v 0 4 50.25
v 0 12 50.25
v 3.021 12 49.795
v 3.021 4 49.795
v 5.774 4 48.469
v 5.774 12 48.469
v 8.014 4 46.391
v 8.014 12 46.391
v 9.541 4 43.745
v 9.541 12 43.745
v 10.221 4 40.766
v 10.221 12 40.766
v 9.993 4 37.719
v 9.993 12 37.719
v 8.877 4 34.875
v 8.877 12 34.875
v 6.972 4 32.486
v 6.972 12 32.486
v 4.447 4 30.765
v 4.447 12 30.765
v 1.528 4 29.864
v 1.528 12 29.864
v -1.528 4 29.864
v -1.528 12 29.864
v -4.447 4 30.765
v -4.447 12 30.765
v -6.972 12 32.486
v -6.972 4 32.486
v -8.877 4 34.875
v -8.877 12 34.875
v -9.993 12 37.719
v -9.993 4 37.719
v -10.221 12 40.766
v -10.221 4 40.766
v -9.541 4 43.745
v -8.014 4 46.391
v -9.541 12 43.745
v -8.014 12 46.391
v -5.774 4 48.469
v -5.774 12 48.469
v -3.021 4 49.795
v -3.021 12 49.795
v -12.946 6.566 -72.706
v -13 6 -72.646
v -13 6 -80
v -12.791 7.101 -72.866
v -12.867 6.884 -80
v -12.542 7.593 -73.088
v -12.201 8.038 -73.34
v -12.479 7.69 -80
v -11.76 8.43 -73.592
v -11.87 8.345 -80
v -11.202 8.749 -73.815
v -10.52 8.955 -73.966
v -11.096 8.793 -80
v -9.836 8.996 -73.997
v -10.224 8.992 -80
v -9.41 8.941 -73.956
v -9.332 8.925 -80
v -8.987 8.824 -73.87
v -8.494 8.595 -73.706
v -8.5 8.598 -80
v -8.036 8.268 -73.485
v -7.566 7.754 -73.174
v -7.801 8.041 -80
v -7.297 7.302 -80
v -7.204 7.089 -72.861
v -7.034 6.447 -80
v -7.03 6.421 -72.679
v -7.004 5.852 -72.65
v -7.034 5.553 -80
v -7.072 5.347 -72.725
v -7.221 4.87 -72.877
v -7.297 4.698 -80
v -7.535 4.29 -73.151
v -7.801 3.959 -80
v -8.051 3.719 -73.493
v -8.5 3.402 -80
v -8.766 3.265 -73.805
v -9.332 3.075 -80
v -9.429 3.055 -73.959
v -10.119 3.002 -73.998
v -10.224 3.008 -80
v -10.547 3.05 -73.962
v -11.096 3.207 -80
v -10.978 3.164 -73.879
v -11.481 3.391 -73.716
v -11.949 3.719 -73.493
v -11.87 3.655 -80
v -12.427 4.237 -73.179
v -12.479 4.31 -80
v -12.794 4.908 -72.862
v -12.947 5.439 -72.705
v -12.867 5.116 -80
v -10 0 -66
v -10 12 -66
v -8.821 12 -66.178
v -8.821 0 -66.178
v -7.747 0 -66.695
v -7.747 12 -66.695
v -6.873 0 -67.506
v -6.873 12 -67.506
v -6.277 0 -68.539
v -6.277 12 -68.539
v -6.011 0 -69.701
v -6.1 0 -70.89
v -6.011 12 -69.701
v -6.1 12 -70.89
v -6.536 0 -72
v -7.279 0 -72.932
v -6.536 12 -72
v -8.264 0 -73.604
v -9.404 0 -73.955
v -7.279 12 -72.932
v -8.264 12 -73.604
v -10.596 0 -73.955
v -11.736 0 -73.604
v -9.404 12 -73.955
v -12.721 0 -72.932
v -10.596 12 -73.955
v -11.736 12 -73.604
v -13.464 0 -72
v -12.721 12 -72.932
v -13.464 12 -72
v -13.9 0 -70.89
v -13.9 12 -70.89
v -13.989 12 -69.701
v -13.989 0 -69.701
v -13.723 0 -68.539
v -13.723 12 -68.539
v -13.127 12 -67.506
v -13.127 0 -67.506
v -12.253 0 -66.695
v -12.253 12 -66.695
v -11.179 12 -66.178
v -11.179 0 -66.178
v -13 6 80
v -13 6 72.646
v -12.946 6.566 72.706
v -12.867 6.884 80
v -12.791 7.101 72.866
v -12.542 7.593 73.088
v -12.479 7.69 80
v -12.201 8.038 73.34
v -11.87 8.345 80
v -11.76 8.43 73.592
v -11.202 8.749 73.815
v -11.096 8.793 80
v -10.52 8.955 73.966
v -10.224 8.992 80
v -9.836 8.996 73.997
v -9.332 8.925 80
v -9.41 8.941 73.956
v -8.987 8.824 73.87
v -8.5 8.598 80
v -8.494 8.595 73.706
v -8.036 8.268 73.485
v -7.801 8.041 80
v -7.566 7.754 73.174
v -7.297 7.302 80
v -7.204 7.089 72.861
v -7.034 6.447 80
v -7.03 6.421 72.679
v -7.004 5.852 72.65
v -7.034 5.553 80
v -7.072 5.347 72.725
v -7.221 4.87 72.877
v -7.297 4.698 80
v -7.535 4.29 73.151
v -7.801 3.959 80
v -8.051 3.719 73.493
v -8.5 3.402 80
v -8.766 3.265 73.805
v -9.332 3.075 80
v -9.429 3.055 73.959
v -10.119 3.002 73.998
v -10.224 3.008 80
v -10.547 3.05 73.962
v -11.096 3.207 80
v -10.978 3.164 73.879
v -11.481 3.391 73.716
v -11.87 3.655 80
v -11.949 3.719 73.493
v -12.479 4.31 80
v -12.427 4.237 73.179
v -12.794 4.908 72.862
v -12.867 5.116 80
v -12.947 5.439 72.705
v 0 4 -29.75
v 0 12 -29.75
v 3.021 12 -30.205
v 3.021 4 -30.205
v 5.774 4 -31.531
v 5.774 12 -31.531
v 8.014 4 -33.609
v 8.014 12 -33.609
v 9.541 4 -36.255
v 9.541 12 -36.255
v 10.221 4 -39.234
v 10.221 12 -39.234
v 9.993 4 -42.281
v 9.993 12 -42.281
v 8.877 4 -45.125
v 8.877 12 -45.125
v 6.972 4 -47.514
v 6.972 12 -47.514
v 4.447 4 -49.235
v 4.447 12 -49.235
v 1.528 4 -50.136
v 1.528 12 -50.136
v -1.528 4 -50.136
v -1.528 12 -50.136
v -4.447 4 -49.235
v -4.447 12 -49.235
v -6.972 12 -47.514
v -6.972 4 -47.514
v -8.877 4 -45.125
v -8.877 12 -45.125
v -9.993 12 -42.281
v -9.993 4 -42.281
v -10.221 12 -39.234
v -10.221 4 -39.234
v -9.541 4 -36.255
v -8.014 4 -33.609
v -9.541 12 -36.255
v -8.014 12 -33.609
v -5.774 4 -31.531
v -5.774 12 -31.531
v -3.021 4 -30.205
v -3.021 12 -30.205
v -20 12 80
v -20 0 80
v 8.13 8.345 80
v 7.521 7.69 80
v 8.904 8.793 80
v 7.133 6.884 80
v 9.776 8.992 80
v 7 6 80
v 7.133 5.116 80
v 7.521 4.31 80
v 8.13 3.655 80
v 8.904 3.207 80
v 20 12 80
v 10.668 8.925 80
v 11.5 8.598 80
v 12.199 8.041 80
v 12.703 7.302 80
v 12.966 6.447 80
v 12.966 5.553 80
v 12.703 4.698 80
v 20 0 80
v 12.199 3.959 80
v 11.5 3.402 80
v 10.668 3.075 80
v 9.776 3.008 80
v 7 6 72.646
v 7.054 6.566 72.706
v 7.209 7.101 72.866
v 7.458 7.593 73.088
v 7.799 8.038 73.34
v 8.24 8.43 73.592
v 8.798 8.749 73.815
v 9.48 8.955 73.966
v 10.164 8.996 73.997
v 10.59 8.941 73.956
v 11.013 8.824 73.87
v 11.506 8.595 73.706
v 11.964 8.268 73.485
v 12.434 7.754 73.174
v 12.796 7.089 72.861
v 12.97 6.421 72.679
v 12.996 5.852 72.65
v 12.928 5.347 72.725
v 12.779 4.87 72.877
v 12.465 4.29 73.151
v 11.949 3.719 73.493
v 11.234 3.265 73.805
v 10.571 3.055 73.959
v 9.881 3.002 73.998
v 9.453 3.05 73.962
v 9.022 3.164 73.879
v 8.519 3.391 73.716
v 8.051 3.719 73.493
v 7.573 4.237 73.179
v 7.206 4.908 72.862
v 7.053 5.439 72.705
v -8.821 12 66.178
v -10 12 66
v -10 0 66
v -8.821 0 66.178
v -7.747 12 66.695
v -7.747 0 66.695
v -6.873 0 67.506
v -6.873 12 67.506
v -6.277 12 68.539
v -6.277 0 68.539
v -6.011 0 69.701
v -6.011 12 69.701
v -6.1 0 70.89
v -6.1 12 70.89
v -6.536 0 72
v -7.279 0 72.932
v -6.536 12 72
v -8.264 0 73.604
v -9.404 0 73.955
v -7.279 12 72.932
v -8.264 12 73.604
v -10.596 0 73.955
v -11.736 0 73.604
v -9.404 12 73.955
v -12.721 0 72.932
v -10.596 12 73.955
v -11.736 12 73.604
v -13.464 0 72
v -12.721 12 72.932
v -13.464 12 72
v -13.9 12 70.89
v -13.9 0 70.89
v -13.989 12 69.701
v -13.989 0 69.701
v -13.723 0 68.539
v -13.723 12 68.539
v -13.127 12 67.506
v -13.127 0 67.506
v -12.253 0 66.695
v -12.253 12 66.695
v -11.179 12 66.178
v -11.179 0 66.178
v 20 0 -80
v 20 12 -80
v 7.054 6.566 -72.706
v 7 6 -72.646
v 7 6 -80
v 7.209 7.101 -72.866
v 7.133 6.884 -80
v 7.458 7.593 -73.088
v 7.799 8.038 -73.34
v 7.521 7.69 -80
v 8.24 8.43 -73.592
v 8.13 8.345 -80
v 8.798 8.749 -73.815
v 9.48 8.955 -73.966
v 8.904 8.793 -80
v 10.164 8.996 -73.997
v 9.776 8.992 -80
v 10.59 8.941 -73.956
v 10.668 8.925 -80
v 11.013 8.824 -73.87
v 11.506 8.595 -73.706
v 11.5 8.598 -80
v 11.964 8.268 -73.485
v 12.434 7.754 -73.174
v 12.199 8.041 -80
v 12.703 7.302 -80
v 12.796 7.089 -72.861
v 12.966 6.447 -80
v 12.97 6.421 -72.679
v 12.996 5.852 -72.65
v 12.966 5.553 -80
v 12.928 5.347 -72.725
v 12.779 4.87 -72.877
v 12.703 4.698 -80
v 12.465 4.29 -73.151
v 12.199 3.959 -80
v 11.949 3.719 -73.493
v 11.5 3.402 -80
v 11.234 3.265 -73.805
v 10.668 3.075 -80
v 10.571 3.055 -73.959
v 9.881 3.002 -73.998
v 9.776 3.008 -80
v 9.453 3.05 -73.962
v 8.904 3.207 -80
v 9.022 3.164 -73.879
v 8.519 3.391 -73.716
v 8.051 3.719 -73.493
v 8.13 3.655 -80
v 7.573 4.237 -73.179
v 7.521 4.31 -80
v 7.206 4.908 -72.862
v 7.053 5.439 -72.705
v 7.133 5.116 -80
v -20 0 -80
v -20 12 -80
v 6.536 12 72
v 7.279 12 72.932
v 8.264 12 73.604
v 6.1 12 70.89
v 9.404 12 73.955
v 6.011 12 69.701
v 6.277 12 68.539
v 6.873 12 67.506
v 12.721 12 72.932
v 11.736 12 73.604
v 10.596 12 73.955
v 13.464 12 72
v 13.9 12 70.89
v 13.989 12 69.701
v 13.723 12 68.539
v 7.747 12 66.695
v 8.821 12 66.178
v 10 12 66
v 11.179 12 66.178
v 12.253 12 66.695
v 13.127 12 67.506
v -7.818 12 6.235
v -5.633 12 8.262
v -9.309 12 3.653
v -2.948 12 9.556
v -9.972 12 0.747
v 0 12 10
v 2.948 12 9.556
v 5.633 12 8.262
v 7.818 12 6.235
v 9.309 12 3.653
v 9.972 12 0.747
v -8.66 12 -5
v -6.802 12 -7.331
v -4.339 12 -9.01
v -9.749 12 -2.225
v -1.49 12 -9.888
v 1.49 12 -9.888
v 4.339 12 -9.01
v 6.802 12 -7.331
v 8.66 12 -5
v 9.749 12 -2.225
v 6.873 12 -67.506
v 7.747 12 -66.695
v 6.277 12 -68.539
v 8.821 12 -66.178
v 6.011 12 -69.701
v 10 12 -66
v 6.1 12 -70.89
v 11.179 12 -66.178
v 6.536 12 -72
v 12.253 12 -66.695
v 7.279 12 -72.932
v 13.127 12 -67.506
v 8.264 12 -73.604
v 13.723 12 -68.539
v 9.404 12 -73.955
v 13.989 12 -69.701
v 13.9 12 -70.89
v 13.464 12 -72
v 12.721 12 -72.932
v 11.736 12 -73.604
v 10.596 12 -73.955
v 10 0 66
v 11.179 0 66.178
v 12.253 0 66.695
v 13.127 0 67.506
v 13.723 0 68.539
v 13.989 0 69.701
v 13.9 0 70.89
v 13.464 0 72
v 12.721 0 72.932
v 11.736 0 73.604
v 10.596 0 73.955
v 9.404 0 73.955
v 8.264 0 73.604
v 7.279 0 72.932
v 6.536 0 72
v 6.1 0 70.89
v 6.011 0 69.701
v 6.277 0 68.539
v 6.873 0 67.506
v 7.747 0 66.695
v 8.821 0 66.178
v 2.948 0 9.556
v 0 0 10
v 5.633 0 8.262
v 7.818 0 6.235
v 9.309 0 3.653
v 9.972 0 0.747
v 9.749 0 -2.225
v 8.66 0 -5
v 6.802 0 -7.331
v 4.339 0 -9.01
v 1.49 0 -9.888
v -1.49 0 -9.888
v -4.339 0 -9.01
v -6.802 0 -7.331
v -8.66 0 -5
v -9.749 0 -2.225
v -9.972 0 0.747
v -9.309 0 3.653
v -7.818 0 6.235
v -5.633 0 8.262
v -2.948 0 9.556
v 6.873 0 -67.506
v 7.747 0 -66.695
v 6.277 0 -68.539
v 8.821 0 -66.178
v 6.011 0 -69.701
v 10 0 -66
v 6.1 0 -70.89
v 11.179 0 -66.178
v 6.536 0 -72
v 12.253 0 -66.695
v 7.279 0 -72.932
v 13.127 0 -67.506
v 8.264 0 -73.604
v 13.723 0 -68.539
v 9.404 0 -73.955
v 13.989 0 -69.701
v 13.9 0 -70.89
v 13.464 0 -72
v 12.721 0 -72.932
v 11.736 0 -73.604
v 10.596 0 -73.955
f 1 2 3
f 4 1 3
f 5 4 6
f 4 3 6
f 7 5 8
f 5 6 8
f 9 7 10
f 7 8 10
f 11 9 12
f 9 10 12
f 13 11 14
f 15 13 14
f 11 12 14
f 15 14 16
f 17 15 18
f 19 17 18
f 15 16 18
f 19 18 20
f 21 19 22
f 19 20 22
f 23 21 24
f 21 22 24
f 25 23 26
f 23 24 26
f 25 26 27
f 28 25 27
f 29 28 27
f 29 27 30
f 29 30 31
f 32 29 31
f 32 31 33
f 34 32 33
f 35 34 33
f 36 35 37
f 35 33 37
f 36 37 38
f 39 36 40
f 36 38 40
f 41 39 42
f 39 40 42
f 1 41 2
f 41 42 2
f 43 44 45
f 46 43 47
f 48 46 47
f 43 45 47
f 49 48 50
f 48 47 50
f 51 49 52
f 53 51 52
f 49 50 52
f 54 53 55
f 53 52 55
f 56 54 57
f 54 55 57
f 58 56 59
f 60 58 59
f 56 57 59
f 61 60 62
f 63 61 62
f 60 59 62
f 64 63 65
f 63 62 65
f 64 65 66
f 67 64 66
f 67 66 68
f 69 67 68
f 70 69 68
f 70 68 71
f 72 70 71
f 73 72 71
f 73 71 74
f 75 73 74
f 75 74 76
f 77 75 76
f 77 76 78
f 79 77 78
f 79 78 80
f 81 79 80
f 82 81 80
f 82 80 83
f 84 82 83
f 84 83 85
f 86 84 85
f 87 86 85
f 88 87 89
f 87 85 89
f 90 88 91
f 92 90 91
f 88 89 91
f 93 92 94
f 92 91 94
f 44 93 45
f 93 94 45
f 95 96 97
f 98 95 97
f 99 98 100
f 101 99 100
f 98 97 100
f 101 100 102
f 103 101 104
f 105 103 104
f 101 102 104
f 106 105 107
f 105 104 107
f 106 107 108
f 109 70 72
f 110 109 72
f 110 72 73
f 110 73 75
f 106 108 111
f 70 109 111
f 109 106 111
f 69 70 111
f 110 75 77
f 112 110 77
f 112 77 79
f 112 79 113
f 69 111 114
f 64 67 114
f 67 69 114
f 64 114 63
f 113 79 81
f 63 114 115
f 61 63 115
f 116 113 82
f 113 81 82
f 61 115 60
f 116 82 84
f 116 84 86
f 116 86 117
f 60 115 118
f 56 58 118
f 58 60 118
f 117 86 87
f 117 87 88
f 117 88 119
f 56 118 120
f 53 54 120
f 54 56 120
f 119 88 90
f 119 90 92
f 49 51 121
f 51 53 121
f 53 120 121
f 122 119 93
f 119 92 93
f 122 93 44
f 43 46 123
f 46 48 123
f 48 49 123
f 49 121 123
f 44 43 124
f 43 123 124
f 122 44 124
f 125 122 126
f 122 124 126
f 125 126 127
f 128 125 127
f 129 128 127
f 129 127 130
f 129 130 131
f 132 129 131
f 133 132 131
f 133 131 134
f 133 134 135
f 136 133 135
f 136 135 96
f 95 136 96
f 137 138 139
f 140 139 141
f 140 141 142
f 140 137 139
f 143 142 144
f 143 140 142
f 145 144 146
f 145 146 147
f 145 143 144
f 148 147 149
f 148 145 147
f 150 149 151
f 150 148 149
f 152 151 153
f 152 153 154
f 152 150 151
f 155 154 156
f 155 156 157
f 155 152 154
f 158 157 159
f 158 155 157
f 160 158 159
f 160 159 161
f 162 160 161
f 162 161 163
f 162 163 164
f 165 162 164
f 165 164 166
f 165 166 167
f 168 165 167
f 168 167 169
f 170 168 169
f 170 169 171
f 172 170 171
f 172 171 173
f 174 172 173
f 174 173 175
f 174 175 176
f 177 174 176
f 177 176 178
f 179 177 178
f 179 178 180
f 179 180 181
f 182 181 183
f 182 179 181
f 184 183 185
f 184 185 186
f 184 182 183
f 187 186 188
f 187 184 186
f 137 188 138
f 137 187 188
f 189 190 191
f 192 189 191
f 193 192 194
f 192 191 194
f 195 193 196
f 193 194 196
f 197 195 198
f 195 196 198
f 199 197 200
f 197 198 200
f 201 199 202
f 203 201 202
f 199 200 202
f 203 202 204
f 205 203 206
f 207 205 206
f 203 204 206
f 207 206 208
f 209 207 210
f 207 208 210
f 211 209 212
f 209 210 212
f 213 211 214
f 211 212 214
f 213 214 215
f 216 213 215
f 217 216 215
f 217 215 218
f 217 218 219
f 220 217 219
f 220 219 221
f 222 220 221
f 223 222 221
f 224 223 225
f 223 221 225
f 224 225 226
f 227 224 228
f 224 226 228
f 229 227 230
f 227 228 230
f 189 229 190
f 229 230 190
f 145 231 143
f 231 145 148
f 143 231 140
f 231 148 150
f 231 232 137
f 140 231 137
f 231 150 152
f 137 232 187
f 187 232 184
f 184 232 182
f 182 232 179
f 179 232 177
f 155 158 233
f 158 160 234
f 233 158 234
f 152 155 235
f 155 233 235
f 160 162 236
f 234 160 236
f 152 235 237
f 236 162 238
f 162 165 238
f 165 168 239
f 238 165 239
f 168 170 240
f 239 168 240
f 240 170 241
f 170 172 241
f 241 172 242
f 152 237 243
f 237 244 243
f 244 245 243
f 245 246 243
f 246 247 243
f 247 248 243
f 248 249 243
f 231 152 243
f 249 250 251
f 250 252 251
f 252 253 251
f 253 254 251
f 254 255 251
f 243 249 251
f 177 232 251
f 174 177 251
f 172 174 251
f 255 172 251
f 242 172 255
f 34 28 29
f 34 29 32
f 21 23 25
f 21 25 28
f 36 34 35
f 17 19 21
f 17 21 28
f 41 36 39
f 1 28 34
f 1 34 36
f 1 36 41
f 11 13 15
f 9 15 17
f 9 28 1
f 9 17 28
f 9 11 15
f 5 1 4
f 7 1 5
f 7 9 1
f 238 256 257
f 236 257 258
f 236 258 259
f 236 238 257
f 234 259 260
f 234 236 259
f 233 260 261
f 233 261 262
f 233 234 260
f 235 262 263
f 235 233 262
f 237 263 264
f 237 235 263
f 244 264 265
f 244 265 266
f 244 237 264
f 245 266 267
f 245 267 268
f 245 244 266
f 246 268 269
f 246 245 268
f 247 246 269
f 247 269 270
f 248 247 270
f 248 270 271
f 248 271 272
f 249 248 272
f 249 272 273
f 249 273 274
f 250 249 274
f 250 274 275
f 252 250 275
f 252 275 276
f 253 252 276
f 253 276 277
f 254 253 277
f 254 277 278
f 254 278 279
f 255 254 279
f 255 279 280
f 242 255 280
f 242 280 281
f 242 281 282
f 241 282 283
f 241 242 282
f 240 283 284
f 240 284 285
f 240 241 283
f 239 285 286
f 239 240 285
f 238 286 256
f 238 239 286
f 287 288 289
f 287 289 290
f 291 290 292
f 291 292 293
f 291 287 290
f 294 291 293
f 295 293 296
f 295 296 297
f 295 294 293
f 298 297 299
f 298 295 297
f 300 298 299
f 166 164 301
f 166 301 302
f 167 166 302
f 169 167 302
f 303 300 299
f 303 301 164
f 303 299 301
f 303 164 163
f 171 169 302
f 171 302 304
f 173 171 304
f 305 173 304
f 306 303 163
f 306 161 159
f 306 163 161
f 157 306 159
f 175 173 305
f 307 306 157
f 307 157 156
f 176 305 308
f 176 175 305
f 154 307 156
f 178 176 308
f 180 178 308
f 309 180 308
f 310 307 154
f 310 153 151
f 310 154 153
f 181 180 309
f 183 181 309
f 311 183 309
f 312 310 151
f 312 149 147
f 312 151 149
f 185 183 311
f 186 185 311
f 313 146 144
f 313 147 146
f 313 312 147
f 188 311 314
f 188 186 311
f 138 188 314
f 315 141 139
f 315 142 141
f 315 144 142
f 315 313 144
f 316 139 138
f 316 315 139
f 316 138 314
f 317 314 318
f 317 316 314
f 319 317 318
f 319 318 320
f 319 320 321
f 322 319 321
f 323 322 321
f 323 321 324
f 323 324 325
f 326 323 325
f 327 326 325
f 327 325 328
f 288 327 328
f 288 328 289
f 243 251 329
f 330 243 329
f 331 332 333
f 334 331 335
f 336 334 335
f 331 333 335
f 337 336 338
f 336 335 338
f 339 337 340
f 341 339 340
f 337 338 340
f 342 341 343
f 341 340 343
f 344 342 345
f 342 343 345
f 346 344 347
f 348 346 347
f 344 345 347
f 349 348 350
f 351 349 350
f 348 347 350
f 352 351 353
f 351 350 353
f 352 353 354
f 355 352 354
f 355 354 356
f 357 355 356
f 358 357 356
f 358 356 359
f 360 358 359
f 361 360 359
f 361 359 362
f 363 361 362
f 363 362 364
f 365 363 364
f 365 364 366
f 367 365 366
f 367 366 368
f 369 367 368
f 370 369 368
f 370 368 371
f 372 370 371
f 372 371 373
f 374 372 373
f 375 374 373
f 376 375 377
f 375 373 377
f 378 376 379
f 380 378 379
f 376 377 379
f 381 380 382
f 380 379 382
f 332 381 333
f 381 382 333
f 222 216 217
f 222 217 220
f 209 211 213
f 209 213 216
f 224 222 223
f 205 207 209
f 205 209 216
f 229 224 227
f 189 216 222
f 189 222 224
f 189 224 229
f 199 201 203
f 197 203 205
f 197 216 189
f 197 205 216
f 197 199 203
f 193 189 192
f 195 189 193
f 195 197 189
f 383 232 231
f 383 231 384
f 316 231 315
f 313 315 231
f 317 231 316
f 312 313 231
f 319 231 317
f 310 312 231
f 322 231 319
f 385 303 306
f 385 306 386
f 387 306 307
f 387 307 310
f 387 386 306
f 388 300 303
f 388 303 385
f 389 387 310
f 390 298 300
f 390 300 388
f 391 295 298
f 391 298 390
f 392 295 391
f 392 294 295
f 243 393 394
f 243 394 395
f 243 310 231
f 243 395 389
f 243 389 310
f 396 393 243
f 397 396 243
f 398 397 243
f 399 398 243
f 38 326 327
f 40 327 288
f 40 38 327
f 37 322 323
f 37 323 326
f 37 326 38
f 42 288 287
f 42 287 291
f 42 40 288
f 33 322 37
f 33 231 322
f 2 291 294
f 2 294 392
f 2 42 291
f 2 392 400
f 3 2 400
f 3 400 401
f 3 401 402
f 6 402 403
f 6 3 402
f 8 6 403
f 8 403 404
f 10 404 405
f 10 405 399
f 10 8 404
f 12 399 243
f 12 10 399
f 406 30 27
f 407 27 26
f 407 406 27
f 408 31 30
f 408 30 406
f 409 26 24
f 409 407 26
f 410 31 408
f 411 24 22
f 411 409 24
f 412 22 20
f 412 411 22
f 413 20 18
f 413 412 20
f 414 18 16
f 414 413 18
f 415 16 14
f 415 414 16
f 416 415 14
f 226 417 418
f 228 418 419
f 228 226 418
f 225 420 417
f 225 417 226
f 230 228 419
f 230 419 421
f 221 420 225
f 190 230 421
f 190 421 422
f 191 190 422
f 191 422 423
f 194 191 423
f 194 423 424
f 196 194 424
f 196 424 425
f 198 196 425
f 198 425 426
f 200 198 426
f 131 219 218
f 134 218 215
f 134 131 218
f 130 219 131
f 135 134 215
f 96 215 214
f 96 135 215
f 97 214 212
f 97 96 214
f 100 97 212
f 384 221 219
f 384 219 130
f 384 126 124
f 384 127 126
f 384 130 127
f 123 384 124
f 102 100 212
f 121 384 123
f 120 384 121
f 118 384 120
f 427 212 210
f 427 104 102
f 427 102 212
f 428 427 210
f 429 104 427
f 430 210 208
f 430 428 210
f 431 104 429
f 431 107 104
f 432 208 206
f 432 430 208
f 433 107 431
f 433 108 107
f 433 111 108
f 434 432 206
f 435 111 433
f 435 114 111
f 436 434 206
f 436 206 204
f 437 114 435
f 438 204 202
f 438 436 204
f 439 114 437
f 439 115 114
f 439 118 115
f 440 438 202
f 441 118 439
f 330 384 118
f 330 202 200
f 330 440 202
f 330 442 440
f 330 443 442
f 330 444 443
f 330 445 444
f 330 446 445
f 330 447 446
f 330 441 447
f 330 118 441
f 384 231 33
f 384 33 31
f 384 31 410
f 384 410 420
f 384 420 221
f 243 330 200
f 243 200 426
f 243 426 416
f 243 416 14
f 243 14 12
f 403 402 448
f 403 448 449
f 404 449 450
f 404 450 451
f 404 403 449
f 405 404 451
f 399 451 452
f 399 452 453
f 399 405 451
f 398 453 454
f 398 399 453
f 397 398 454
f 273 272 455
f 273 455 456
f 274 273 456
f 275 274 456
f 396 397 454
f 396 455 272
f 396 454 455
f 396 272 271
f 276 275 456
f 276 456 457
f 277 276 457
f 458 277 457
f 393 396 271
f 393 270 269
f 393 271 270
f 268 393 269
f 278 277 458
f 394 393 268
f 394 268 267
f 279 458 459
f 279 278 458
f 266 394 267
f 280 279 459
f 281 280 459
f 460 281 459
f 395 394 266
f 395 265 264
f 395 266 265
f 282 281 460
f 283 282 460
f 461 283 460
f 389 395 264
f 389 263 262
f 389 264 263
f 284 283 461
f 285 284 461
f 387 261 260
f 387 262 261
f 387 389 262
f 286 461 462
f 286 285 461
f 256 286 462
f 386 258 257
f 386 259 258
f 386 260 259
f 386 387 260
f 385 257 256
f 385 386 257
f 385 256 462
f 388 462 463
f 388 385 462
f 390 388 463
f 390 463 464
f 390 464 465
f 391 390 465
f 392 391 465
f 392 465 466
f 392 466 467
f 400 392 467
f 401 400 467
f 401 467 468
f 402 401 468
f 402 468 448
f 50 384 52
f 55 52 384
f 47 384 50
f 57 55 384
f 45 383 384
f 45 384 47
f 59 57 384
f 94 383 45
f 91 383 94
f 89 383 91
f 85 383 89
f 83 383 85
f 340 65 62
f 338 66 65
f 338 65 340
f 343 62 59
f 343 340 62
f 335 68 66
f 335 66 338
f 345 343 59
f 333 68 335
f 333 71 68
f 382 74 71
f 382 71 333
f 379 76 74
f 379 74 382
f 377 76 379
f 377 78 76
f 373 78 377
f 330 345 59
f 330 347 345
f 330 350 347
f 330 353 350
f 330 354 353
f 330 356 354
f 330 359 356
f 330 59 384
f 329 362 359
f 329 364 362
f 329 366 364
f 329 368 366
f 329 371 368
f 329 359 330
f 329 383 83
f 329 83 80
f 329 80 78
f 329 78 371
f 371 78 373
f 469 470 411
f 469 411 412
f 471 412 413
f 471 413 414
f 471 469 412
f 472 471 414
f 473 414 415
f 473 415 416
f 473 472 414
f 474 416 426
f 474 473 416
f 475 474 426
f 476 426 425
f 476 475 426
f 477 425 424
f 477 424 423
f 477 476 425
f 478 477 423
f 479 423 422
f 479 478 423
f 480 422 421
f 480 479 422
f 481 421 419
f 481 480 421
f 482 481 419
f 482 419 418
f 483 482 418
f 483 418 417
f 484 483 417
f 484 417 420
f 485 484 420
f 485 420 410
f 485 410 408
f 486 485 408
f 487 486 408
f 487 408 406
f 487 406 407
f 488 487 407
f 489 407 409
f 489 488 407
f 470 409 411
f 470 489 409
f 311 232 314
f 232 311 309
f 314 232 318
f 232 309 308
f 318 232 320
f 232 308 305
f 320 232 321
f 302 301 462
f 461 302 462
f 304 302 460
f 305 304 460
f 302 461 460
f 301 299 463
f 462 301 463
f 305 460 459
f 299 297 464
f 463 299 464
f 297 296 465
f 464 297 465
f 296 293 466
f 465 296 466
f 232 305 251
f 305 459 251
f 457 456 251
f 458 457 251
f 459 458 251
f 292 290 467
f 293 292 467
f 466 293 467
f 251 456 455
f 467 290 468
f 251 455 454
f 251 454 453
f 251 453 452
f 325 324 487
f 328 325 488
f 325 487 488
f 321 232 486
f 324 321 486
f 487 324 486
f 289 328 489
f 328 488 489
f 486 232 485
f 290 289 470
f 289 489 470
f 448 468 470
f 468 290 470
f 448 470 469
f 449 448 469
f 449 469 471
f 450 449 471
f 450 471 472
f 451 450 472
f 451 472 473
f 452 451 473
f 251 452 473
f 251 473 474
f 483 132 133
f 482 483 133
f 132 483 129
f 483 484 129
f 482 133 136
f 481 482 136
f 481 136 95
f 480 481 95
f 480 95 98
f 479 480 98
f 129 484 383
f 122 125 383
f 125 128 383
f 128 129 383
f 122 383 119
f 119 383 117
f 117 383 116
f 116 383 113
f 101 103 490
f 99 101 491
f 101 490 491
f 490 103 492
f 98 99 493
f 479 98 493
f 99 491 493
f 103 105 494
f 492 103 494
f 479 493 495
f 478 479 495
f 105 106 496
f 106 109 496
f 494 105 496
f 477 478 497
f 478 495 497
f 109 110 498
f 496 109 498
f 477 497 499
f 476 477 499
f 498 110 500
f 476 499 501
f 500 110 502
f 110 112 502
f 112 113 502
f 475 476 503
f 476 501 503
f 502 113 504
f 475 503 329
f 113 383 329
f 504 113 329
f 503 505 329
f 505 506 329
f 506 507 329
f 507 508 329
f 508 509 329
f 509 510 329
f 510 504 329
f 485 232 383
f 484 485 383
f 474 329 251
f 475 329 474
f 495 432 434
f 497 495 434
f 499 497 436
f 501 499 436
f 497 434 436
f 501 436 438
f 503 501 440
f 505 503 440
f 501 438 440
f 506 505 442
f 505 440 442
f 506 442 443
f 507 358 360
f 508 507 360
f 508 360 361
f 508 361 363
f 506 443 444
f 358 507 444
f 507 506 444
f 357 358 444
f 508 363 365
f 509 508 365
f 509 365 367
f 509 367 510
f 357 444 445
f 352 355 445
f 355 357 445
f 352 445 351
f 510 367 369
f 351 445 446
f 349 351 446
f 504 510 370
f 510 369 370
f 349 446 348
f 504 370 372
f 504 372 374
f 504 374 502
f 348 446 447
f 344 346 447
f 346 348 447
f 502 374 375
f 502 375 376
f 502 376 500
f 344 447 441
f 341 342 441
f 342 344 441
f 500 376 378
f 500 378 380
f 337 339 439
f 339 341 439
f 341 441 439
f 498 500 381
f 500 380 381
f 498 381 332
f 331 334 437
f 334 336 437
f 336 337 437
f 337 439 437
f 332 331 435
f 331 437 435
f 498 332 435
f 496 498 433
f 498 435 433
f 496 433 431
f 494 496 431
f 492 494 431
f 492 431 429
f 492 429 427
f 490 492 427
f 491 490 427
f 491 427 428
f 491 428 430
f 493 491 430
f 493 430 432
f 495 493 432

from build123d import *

# Parameters (mm, degrees)
SKETCH1_W           = 40
SKETCH1_H           = 160
SKETCH1_R           = 10
BOSS_EXTRUDE1_DEPTH = 12
CUT_EXTRUDE3_REACH  = 85.331
SKETCH4_R           = 4
CUT_EXTRUDE4_REACH  = 163.691
SKETCH5_R           = 3
SKETCH6_R           = 10.25
CUT_EXTRUDE5_DEPTH  = 8


with BuildPart() as part:
    # Sketch1 → Boss-Extrude1 (new body)
    with BuildSketch(Plane(origin=(0, 0, 0), x_dir=(1, 0, 0), z_dir=(0, 1, 0))):
        Rectangle(SKETCH1_W, SKETCH1_H)
        with Locations(Location((0, 0, 0), (0, 0, 270))):
            Circle(SKETCH1_R, mode=Mode.SUBTRACT)
    extrude(amount=BOSS_EXTRUDE1_DEPTH)

    # Sketch4 → Cut-Extrude3 (cut, up to next)
    with BuildSketch(Plane(origin=(0, 12, 0), x_dir=(1, 0, 0), z_dir=(0, 1, 0)), mode=Mode.PRIVATE) as cut_extrude3_sk1:
        with Locations(Location((-10, 70, 0), (0, 0, 270))):
            Circle(SKETCH4_R)
    cut_extrude3_tool1 = extrude(cut_extrude3_sk1.sketch, amount=-CUT_EXTRUDE3_REACH, mode=Mode.PRIVATE) & part.part
    # Sketch4 → Cut-Extrude3 (cut, up to next)
    with BuildSketch(Plane(origin=(0, 12, 0), x_dir=(1, 0, 0), z_dir=(0, 1, 0)), mode=Mode.PRIVATE) as cut_extrude3_sk2:
        with Locations(Location((10, 70, 0), (0, 0, 270))):
            Circle(SKETCH4_R)
    cut_extrude3_tool2 = extrude(cut_extrude3_sk2.sketch, amount=-CUT_EXTRUDE3_REACH, mode=Mode.PRIVATE) & part.part
    cut_extrude3_1 = cut_extrude3_tool1.solids().sort_by_distance((-10, 12, -70))[0]
    add(cut_extrude3_1, mode=Mode.SUBTRACT)
    cut_extrude3_2 = cut_extrude3_tool2.solids().sort_by_distance((10, 12, -70))[0]
    add(cut_extrude3_2, mode=Mode.SUBTRACT)
    cut_extrude3 = cut_extrude3_1 + cut_extrude3_2  # Cut-Extrude3 as one shape, for the pattern or mirror that repeats it

    # Sketch5 → Cut-Extrude4 (cut, up to next)
    with BuildSketch(Plane(origin=(0, 0, -80), x_dir=(-1, 0, 0), z_dir=(0, 0, -1)), mode=Mode.PRIVATE) as cut_extrude4_sk1:
        with Locations((10, 6)):
            Circle(SKETCH5_R)
    cut_extrude4_tool1 = extrude(cut_extrude4_sk1.sketch, amount=-CUT_EXTRUDE4_REACH, mode=Mode.PRIVATE) & part.part
    # Sketch5 → Cut-Extrude4 (cut, up to next)
    with BuildSketch(Plane(origin=(0, 0, -80), x_dir=(-1, 0, 0), z_dir=(0, 0, -1)), mode=Mode.PRIVATE) as cut_extrude4_sk2:
        with Locations((-10, 6)):
            Circle(SKETCH5_R)
    cut_extrude4_tool2 = extrude(cut_extrude4_sk2.sketch, amount=-CUT_EXTRUDE4_REACH, mode=Mode.PRIVATE) & part.part
    cut_extrude4_1 = cut_extrude4_tool1.solids().sort_by_distance((-10, 6, -80))[0]
    add(cut_extrude4_1, mode=Mode.SUBTRACT)
    cut_extrude4_2 = cut_extrude4_tool2.solids().sort_by_distance((10, 6, -80))[0]
    add(cut_extrude4_2, mode=Mode.SUBTRACT)
    cut_extrude4 = cut_extrude4_1 + cut_extrude4_2  # Cut-Extrude4 as one shape, for the pattern or mirror that repeats it

    # Mirror1: Cut-Extrude3, Cut-Extrude4 across plane
    add(cut_extrude3.mirror(Plane.XY), mode=Mode.SUBTRACT)
    add(cut_extrude4.mirror(Plane.XY), mode=Mode.SUBTRACT)

    # Sketch6 → Cut-Extrude5 (cut)
    with BuildSketch(Plane(origin=(0, 12, 0), x_dir=(1, 0, 0), z_dir=(0, 1, 0))):
        with Locations(Location((0, 40, 0), (0, 0, 270))):
            Circle(SKETCH6_R)
        with Locations(Location((0, -40, 0), (0, 0, 270))):
            Circle(SKETCH6_R)
    extrude(amount=-CUT_EXTRUDE5_DEPTH, mode=Mode.SUBTRACT)


solid = part.part
